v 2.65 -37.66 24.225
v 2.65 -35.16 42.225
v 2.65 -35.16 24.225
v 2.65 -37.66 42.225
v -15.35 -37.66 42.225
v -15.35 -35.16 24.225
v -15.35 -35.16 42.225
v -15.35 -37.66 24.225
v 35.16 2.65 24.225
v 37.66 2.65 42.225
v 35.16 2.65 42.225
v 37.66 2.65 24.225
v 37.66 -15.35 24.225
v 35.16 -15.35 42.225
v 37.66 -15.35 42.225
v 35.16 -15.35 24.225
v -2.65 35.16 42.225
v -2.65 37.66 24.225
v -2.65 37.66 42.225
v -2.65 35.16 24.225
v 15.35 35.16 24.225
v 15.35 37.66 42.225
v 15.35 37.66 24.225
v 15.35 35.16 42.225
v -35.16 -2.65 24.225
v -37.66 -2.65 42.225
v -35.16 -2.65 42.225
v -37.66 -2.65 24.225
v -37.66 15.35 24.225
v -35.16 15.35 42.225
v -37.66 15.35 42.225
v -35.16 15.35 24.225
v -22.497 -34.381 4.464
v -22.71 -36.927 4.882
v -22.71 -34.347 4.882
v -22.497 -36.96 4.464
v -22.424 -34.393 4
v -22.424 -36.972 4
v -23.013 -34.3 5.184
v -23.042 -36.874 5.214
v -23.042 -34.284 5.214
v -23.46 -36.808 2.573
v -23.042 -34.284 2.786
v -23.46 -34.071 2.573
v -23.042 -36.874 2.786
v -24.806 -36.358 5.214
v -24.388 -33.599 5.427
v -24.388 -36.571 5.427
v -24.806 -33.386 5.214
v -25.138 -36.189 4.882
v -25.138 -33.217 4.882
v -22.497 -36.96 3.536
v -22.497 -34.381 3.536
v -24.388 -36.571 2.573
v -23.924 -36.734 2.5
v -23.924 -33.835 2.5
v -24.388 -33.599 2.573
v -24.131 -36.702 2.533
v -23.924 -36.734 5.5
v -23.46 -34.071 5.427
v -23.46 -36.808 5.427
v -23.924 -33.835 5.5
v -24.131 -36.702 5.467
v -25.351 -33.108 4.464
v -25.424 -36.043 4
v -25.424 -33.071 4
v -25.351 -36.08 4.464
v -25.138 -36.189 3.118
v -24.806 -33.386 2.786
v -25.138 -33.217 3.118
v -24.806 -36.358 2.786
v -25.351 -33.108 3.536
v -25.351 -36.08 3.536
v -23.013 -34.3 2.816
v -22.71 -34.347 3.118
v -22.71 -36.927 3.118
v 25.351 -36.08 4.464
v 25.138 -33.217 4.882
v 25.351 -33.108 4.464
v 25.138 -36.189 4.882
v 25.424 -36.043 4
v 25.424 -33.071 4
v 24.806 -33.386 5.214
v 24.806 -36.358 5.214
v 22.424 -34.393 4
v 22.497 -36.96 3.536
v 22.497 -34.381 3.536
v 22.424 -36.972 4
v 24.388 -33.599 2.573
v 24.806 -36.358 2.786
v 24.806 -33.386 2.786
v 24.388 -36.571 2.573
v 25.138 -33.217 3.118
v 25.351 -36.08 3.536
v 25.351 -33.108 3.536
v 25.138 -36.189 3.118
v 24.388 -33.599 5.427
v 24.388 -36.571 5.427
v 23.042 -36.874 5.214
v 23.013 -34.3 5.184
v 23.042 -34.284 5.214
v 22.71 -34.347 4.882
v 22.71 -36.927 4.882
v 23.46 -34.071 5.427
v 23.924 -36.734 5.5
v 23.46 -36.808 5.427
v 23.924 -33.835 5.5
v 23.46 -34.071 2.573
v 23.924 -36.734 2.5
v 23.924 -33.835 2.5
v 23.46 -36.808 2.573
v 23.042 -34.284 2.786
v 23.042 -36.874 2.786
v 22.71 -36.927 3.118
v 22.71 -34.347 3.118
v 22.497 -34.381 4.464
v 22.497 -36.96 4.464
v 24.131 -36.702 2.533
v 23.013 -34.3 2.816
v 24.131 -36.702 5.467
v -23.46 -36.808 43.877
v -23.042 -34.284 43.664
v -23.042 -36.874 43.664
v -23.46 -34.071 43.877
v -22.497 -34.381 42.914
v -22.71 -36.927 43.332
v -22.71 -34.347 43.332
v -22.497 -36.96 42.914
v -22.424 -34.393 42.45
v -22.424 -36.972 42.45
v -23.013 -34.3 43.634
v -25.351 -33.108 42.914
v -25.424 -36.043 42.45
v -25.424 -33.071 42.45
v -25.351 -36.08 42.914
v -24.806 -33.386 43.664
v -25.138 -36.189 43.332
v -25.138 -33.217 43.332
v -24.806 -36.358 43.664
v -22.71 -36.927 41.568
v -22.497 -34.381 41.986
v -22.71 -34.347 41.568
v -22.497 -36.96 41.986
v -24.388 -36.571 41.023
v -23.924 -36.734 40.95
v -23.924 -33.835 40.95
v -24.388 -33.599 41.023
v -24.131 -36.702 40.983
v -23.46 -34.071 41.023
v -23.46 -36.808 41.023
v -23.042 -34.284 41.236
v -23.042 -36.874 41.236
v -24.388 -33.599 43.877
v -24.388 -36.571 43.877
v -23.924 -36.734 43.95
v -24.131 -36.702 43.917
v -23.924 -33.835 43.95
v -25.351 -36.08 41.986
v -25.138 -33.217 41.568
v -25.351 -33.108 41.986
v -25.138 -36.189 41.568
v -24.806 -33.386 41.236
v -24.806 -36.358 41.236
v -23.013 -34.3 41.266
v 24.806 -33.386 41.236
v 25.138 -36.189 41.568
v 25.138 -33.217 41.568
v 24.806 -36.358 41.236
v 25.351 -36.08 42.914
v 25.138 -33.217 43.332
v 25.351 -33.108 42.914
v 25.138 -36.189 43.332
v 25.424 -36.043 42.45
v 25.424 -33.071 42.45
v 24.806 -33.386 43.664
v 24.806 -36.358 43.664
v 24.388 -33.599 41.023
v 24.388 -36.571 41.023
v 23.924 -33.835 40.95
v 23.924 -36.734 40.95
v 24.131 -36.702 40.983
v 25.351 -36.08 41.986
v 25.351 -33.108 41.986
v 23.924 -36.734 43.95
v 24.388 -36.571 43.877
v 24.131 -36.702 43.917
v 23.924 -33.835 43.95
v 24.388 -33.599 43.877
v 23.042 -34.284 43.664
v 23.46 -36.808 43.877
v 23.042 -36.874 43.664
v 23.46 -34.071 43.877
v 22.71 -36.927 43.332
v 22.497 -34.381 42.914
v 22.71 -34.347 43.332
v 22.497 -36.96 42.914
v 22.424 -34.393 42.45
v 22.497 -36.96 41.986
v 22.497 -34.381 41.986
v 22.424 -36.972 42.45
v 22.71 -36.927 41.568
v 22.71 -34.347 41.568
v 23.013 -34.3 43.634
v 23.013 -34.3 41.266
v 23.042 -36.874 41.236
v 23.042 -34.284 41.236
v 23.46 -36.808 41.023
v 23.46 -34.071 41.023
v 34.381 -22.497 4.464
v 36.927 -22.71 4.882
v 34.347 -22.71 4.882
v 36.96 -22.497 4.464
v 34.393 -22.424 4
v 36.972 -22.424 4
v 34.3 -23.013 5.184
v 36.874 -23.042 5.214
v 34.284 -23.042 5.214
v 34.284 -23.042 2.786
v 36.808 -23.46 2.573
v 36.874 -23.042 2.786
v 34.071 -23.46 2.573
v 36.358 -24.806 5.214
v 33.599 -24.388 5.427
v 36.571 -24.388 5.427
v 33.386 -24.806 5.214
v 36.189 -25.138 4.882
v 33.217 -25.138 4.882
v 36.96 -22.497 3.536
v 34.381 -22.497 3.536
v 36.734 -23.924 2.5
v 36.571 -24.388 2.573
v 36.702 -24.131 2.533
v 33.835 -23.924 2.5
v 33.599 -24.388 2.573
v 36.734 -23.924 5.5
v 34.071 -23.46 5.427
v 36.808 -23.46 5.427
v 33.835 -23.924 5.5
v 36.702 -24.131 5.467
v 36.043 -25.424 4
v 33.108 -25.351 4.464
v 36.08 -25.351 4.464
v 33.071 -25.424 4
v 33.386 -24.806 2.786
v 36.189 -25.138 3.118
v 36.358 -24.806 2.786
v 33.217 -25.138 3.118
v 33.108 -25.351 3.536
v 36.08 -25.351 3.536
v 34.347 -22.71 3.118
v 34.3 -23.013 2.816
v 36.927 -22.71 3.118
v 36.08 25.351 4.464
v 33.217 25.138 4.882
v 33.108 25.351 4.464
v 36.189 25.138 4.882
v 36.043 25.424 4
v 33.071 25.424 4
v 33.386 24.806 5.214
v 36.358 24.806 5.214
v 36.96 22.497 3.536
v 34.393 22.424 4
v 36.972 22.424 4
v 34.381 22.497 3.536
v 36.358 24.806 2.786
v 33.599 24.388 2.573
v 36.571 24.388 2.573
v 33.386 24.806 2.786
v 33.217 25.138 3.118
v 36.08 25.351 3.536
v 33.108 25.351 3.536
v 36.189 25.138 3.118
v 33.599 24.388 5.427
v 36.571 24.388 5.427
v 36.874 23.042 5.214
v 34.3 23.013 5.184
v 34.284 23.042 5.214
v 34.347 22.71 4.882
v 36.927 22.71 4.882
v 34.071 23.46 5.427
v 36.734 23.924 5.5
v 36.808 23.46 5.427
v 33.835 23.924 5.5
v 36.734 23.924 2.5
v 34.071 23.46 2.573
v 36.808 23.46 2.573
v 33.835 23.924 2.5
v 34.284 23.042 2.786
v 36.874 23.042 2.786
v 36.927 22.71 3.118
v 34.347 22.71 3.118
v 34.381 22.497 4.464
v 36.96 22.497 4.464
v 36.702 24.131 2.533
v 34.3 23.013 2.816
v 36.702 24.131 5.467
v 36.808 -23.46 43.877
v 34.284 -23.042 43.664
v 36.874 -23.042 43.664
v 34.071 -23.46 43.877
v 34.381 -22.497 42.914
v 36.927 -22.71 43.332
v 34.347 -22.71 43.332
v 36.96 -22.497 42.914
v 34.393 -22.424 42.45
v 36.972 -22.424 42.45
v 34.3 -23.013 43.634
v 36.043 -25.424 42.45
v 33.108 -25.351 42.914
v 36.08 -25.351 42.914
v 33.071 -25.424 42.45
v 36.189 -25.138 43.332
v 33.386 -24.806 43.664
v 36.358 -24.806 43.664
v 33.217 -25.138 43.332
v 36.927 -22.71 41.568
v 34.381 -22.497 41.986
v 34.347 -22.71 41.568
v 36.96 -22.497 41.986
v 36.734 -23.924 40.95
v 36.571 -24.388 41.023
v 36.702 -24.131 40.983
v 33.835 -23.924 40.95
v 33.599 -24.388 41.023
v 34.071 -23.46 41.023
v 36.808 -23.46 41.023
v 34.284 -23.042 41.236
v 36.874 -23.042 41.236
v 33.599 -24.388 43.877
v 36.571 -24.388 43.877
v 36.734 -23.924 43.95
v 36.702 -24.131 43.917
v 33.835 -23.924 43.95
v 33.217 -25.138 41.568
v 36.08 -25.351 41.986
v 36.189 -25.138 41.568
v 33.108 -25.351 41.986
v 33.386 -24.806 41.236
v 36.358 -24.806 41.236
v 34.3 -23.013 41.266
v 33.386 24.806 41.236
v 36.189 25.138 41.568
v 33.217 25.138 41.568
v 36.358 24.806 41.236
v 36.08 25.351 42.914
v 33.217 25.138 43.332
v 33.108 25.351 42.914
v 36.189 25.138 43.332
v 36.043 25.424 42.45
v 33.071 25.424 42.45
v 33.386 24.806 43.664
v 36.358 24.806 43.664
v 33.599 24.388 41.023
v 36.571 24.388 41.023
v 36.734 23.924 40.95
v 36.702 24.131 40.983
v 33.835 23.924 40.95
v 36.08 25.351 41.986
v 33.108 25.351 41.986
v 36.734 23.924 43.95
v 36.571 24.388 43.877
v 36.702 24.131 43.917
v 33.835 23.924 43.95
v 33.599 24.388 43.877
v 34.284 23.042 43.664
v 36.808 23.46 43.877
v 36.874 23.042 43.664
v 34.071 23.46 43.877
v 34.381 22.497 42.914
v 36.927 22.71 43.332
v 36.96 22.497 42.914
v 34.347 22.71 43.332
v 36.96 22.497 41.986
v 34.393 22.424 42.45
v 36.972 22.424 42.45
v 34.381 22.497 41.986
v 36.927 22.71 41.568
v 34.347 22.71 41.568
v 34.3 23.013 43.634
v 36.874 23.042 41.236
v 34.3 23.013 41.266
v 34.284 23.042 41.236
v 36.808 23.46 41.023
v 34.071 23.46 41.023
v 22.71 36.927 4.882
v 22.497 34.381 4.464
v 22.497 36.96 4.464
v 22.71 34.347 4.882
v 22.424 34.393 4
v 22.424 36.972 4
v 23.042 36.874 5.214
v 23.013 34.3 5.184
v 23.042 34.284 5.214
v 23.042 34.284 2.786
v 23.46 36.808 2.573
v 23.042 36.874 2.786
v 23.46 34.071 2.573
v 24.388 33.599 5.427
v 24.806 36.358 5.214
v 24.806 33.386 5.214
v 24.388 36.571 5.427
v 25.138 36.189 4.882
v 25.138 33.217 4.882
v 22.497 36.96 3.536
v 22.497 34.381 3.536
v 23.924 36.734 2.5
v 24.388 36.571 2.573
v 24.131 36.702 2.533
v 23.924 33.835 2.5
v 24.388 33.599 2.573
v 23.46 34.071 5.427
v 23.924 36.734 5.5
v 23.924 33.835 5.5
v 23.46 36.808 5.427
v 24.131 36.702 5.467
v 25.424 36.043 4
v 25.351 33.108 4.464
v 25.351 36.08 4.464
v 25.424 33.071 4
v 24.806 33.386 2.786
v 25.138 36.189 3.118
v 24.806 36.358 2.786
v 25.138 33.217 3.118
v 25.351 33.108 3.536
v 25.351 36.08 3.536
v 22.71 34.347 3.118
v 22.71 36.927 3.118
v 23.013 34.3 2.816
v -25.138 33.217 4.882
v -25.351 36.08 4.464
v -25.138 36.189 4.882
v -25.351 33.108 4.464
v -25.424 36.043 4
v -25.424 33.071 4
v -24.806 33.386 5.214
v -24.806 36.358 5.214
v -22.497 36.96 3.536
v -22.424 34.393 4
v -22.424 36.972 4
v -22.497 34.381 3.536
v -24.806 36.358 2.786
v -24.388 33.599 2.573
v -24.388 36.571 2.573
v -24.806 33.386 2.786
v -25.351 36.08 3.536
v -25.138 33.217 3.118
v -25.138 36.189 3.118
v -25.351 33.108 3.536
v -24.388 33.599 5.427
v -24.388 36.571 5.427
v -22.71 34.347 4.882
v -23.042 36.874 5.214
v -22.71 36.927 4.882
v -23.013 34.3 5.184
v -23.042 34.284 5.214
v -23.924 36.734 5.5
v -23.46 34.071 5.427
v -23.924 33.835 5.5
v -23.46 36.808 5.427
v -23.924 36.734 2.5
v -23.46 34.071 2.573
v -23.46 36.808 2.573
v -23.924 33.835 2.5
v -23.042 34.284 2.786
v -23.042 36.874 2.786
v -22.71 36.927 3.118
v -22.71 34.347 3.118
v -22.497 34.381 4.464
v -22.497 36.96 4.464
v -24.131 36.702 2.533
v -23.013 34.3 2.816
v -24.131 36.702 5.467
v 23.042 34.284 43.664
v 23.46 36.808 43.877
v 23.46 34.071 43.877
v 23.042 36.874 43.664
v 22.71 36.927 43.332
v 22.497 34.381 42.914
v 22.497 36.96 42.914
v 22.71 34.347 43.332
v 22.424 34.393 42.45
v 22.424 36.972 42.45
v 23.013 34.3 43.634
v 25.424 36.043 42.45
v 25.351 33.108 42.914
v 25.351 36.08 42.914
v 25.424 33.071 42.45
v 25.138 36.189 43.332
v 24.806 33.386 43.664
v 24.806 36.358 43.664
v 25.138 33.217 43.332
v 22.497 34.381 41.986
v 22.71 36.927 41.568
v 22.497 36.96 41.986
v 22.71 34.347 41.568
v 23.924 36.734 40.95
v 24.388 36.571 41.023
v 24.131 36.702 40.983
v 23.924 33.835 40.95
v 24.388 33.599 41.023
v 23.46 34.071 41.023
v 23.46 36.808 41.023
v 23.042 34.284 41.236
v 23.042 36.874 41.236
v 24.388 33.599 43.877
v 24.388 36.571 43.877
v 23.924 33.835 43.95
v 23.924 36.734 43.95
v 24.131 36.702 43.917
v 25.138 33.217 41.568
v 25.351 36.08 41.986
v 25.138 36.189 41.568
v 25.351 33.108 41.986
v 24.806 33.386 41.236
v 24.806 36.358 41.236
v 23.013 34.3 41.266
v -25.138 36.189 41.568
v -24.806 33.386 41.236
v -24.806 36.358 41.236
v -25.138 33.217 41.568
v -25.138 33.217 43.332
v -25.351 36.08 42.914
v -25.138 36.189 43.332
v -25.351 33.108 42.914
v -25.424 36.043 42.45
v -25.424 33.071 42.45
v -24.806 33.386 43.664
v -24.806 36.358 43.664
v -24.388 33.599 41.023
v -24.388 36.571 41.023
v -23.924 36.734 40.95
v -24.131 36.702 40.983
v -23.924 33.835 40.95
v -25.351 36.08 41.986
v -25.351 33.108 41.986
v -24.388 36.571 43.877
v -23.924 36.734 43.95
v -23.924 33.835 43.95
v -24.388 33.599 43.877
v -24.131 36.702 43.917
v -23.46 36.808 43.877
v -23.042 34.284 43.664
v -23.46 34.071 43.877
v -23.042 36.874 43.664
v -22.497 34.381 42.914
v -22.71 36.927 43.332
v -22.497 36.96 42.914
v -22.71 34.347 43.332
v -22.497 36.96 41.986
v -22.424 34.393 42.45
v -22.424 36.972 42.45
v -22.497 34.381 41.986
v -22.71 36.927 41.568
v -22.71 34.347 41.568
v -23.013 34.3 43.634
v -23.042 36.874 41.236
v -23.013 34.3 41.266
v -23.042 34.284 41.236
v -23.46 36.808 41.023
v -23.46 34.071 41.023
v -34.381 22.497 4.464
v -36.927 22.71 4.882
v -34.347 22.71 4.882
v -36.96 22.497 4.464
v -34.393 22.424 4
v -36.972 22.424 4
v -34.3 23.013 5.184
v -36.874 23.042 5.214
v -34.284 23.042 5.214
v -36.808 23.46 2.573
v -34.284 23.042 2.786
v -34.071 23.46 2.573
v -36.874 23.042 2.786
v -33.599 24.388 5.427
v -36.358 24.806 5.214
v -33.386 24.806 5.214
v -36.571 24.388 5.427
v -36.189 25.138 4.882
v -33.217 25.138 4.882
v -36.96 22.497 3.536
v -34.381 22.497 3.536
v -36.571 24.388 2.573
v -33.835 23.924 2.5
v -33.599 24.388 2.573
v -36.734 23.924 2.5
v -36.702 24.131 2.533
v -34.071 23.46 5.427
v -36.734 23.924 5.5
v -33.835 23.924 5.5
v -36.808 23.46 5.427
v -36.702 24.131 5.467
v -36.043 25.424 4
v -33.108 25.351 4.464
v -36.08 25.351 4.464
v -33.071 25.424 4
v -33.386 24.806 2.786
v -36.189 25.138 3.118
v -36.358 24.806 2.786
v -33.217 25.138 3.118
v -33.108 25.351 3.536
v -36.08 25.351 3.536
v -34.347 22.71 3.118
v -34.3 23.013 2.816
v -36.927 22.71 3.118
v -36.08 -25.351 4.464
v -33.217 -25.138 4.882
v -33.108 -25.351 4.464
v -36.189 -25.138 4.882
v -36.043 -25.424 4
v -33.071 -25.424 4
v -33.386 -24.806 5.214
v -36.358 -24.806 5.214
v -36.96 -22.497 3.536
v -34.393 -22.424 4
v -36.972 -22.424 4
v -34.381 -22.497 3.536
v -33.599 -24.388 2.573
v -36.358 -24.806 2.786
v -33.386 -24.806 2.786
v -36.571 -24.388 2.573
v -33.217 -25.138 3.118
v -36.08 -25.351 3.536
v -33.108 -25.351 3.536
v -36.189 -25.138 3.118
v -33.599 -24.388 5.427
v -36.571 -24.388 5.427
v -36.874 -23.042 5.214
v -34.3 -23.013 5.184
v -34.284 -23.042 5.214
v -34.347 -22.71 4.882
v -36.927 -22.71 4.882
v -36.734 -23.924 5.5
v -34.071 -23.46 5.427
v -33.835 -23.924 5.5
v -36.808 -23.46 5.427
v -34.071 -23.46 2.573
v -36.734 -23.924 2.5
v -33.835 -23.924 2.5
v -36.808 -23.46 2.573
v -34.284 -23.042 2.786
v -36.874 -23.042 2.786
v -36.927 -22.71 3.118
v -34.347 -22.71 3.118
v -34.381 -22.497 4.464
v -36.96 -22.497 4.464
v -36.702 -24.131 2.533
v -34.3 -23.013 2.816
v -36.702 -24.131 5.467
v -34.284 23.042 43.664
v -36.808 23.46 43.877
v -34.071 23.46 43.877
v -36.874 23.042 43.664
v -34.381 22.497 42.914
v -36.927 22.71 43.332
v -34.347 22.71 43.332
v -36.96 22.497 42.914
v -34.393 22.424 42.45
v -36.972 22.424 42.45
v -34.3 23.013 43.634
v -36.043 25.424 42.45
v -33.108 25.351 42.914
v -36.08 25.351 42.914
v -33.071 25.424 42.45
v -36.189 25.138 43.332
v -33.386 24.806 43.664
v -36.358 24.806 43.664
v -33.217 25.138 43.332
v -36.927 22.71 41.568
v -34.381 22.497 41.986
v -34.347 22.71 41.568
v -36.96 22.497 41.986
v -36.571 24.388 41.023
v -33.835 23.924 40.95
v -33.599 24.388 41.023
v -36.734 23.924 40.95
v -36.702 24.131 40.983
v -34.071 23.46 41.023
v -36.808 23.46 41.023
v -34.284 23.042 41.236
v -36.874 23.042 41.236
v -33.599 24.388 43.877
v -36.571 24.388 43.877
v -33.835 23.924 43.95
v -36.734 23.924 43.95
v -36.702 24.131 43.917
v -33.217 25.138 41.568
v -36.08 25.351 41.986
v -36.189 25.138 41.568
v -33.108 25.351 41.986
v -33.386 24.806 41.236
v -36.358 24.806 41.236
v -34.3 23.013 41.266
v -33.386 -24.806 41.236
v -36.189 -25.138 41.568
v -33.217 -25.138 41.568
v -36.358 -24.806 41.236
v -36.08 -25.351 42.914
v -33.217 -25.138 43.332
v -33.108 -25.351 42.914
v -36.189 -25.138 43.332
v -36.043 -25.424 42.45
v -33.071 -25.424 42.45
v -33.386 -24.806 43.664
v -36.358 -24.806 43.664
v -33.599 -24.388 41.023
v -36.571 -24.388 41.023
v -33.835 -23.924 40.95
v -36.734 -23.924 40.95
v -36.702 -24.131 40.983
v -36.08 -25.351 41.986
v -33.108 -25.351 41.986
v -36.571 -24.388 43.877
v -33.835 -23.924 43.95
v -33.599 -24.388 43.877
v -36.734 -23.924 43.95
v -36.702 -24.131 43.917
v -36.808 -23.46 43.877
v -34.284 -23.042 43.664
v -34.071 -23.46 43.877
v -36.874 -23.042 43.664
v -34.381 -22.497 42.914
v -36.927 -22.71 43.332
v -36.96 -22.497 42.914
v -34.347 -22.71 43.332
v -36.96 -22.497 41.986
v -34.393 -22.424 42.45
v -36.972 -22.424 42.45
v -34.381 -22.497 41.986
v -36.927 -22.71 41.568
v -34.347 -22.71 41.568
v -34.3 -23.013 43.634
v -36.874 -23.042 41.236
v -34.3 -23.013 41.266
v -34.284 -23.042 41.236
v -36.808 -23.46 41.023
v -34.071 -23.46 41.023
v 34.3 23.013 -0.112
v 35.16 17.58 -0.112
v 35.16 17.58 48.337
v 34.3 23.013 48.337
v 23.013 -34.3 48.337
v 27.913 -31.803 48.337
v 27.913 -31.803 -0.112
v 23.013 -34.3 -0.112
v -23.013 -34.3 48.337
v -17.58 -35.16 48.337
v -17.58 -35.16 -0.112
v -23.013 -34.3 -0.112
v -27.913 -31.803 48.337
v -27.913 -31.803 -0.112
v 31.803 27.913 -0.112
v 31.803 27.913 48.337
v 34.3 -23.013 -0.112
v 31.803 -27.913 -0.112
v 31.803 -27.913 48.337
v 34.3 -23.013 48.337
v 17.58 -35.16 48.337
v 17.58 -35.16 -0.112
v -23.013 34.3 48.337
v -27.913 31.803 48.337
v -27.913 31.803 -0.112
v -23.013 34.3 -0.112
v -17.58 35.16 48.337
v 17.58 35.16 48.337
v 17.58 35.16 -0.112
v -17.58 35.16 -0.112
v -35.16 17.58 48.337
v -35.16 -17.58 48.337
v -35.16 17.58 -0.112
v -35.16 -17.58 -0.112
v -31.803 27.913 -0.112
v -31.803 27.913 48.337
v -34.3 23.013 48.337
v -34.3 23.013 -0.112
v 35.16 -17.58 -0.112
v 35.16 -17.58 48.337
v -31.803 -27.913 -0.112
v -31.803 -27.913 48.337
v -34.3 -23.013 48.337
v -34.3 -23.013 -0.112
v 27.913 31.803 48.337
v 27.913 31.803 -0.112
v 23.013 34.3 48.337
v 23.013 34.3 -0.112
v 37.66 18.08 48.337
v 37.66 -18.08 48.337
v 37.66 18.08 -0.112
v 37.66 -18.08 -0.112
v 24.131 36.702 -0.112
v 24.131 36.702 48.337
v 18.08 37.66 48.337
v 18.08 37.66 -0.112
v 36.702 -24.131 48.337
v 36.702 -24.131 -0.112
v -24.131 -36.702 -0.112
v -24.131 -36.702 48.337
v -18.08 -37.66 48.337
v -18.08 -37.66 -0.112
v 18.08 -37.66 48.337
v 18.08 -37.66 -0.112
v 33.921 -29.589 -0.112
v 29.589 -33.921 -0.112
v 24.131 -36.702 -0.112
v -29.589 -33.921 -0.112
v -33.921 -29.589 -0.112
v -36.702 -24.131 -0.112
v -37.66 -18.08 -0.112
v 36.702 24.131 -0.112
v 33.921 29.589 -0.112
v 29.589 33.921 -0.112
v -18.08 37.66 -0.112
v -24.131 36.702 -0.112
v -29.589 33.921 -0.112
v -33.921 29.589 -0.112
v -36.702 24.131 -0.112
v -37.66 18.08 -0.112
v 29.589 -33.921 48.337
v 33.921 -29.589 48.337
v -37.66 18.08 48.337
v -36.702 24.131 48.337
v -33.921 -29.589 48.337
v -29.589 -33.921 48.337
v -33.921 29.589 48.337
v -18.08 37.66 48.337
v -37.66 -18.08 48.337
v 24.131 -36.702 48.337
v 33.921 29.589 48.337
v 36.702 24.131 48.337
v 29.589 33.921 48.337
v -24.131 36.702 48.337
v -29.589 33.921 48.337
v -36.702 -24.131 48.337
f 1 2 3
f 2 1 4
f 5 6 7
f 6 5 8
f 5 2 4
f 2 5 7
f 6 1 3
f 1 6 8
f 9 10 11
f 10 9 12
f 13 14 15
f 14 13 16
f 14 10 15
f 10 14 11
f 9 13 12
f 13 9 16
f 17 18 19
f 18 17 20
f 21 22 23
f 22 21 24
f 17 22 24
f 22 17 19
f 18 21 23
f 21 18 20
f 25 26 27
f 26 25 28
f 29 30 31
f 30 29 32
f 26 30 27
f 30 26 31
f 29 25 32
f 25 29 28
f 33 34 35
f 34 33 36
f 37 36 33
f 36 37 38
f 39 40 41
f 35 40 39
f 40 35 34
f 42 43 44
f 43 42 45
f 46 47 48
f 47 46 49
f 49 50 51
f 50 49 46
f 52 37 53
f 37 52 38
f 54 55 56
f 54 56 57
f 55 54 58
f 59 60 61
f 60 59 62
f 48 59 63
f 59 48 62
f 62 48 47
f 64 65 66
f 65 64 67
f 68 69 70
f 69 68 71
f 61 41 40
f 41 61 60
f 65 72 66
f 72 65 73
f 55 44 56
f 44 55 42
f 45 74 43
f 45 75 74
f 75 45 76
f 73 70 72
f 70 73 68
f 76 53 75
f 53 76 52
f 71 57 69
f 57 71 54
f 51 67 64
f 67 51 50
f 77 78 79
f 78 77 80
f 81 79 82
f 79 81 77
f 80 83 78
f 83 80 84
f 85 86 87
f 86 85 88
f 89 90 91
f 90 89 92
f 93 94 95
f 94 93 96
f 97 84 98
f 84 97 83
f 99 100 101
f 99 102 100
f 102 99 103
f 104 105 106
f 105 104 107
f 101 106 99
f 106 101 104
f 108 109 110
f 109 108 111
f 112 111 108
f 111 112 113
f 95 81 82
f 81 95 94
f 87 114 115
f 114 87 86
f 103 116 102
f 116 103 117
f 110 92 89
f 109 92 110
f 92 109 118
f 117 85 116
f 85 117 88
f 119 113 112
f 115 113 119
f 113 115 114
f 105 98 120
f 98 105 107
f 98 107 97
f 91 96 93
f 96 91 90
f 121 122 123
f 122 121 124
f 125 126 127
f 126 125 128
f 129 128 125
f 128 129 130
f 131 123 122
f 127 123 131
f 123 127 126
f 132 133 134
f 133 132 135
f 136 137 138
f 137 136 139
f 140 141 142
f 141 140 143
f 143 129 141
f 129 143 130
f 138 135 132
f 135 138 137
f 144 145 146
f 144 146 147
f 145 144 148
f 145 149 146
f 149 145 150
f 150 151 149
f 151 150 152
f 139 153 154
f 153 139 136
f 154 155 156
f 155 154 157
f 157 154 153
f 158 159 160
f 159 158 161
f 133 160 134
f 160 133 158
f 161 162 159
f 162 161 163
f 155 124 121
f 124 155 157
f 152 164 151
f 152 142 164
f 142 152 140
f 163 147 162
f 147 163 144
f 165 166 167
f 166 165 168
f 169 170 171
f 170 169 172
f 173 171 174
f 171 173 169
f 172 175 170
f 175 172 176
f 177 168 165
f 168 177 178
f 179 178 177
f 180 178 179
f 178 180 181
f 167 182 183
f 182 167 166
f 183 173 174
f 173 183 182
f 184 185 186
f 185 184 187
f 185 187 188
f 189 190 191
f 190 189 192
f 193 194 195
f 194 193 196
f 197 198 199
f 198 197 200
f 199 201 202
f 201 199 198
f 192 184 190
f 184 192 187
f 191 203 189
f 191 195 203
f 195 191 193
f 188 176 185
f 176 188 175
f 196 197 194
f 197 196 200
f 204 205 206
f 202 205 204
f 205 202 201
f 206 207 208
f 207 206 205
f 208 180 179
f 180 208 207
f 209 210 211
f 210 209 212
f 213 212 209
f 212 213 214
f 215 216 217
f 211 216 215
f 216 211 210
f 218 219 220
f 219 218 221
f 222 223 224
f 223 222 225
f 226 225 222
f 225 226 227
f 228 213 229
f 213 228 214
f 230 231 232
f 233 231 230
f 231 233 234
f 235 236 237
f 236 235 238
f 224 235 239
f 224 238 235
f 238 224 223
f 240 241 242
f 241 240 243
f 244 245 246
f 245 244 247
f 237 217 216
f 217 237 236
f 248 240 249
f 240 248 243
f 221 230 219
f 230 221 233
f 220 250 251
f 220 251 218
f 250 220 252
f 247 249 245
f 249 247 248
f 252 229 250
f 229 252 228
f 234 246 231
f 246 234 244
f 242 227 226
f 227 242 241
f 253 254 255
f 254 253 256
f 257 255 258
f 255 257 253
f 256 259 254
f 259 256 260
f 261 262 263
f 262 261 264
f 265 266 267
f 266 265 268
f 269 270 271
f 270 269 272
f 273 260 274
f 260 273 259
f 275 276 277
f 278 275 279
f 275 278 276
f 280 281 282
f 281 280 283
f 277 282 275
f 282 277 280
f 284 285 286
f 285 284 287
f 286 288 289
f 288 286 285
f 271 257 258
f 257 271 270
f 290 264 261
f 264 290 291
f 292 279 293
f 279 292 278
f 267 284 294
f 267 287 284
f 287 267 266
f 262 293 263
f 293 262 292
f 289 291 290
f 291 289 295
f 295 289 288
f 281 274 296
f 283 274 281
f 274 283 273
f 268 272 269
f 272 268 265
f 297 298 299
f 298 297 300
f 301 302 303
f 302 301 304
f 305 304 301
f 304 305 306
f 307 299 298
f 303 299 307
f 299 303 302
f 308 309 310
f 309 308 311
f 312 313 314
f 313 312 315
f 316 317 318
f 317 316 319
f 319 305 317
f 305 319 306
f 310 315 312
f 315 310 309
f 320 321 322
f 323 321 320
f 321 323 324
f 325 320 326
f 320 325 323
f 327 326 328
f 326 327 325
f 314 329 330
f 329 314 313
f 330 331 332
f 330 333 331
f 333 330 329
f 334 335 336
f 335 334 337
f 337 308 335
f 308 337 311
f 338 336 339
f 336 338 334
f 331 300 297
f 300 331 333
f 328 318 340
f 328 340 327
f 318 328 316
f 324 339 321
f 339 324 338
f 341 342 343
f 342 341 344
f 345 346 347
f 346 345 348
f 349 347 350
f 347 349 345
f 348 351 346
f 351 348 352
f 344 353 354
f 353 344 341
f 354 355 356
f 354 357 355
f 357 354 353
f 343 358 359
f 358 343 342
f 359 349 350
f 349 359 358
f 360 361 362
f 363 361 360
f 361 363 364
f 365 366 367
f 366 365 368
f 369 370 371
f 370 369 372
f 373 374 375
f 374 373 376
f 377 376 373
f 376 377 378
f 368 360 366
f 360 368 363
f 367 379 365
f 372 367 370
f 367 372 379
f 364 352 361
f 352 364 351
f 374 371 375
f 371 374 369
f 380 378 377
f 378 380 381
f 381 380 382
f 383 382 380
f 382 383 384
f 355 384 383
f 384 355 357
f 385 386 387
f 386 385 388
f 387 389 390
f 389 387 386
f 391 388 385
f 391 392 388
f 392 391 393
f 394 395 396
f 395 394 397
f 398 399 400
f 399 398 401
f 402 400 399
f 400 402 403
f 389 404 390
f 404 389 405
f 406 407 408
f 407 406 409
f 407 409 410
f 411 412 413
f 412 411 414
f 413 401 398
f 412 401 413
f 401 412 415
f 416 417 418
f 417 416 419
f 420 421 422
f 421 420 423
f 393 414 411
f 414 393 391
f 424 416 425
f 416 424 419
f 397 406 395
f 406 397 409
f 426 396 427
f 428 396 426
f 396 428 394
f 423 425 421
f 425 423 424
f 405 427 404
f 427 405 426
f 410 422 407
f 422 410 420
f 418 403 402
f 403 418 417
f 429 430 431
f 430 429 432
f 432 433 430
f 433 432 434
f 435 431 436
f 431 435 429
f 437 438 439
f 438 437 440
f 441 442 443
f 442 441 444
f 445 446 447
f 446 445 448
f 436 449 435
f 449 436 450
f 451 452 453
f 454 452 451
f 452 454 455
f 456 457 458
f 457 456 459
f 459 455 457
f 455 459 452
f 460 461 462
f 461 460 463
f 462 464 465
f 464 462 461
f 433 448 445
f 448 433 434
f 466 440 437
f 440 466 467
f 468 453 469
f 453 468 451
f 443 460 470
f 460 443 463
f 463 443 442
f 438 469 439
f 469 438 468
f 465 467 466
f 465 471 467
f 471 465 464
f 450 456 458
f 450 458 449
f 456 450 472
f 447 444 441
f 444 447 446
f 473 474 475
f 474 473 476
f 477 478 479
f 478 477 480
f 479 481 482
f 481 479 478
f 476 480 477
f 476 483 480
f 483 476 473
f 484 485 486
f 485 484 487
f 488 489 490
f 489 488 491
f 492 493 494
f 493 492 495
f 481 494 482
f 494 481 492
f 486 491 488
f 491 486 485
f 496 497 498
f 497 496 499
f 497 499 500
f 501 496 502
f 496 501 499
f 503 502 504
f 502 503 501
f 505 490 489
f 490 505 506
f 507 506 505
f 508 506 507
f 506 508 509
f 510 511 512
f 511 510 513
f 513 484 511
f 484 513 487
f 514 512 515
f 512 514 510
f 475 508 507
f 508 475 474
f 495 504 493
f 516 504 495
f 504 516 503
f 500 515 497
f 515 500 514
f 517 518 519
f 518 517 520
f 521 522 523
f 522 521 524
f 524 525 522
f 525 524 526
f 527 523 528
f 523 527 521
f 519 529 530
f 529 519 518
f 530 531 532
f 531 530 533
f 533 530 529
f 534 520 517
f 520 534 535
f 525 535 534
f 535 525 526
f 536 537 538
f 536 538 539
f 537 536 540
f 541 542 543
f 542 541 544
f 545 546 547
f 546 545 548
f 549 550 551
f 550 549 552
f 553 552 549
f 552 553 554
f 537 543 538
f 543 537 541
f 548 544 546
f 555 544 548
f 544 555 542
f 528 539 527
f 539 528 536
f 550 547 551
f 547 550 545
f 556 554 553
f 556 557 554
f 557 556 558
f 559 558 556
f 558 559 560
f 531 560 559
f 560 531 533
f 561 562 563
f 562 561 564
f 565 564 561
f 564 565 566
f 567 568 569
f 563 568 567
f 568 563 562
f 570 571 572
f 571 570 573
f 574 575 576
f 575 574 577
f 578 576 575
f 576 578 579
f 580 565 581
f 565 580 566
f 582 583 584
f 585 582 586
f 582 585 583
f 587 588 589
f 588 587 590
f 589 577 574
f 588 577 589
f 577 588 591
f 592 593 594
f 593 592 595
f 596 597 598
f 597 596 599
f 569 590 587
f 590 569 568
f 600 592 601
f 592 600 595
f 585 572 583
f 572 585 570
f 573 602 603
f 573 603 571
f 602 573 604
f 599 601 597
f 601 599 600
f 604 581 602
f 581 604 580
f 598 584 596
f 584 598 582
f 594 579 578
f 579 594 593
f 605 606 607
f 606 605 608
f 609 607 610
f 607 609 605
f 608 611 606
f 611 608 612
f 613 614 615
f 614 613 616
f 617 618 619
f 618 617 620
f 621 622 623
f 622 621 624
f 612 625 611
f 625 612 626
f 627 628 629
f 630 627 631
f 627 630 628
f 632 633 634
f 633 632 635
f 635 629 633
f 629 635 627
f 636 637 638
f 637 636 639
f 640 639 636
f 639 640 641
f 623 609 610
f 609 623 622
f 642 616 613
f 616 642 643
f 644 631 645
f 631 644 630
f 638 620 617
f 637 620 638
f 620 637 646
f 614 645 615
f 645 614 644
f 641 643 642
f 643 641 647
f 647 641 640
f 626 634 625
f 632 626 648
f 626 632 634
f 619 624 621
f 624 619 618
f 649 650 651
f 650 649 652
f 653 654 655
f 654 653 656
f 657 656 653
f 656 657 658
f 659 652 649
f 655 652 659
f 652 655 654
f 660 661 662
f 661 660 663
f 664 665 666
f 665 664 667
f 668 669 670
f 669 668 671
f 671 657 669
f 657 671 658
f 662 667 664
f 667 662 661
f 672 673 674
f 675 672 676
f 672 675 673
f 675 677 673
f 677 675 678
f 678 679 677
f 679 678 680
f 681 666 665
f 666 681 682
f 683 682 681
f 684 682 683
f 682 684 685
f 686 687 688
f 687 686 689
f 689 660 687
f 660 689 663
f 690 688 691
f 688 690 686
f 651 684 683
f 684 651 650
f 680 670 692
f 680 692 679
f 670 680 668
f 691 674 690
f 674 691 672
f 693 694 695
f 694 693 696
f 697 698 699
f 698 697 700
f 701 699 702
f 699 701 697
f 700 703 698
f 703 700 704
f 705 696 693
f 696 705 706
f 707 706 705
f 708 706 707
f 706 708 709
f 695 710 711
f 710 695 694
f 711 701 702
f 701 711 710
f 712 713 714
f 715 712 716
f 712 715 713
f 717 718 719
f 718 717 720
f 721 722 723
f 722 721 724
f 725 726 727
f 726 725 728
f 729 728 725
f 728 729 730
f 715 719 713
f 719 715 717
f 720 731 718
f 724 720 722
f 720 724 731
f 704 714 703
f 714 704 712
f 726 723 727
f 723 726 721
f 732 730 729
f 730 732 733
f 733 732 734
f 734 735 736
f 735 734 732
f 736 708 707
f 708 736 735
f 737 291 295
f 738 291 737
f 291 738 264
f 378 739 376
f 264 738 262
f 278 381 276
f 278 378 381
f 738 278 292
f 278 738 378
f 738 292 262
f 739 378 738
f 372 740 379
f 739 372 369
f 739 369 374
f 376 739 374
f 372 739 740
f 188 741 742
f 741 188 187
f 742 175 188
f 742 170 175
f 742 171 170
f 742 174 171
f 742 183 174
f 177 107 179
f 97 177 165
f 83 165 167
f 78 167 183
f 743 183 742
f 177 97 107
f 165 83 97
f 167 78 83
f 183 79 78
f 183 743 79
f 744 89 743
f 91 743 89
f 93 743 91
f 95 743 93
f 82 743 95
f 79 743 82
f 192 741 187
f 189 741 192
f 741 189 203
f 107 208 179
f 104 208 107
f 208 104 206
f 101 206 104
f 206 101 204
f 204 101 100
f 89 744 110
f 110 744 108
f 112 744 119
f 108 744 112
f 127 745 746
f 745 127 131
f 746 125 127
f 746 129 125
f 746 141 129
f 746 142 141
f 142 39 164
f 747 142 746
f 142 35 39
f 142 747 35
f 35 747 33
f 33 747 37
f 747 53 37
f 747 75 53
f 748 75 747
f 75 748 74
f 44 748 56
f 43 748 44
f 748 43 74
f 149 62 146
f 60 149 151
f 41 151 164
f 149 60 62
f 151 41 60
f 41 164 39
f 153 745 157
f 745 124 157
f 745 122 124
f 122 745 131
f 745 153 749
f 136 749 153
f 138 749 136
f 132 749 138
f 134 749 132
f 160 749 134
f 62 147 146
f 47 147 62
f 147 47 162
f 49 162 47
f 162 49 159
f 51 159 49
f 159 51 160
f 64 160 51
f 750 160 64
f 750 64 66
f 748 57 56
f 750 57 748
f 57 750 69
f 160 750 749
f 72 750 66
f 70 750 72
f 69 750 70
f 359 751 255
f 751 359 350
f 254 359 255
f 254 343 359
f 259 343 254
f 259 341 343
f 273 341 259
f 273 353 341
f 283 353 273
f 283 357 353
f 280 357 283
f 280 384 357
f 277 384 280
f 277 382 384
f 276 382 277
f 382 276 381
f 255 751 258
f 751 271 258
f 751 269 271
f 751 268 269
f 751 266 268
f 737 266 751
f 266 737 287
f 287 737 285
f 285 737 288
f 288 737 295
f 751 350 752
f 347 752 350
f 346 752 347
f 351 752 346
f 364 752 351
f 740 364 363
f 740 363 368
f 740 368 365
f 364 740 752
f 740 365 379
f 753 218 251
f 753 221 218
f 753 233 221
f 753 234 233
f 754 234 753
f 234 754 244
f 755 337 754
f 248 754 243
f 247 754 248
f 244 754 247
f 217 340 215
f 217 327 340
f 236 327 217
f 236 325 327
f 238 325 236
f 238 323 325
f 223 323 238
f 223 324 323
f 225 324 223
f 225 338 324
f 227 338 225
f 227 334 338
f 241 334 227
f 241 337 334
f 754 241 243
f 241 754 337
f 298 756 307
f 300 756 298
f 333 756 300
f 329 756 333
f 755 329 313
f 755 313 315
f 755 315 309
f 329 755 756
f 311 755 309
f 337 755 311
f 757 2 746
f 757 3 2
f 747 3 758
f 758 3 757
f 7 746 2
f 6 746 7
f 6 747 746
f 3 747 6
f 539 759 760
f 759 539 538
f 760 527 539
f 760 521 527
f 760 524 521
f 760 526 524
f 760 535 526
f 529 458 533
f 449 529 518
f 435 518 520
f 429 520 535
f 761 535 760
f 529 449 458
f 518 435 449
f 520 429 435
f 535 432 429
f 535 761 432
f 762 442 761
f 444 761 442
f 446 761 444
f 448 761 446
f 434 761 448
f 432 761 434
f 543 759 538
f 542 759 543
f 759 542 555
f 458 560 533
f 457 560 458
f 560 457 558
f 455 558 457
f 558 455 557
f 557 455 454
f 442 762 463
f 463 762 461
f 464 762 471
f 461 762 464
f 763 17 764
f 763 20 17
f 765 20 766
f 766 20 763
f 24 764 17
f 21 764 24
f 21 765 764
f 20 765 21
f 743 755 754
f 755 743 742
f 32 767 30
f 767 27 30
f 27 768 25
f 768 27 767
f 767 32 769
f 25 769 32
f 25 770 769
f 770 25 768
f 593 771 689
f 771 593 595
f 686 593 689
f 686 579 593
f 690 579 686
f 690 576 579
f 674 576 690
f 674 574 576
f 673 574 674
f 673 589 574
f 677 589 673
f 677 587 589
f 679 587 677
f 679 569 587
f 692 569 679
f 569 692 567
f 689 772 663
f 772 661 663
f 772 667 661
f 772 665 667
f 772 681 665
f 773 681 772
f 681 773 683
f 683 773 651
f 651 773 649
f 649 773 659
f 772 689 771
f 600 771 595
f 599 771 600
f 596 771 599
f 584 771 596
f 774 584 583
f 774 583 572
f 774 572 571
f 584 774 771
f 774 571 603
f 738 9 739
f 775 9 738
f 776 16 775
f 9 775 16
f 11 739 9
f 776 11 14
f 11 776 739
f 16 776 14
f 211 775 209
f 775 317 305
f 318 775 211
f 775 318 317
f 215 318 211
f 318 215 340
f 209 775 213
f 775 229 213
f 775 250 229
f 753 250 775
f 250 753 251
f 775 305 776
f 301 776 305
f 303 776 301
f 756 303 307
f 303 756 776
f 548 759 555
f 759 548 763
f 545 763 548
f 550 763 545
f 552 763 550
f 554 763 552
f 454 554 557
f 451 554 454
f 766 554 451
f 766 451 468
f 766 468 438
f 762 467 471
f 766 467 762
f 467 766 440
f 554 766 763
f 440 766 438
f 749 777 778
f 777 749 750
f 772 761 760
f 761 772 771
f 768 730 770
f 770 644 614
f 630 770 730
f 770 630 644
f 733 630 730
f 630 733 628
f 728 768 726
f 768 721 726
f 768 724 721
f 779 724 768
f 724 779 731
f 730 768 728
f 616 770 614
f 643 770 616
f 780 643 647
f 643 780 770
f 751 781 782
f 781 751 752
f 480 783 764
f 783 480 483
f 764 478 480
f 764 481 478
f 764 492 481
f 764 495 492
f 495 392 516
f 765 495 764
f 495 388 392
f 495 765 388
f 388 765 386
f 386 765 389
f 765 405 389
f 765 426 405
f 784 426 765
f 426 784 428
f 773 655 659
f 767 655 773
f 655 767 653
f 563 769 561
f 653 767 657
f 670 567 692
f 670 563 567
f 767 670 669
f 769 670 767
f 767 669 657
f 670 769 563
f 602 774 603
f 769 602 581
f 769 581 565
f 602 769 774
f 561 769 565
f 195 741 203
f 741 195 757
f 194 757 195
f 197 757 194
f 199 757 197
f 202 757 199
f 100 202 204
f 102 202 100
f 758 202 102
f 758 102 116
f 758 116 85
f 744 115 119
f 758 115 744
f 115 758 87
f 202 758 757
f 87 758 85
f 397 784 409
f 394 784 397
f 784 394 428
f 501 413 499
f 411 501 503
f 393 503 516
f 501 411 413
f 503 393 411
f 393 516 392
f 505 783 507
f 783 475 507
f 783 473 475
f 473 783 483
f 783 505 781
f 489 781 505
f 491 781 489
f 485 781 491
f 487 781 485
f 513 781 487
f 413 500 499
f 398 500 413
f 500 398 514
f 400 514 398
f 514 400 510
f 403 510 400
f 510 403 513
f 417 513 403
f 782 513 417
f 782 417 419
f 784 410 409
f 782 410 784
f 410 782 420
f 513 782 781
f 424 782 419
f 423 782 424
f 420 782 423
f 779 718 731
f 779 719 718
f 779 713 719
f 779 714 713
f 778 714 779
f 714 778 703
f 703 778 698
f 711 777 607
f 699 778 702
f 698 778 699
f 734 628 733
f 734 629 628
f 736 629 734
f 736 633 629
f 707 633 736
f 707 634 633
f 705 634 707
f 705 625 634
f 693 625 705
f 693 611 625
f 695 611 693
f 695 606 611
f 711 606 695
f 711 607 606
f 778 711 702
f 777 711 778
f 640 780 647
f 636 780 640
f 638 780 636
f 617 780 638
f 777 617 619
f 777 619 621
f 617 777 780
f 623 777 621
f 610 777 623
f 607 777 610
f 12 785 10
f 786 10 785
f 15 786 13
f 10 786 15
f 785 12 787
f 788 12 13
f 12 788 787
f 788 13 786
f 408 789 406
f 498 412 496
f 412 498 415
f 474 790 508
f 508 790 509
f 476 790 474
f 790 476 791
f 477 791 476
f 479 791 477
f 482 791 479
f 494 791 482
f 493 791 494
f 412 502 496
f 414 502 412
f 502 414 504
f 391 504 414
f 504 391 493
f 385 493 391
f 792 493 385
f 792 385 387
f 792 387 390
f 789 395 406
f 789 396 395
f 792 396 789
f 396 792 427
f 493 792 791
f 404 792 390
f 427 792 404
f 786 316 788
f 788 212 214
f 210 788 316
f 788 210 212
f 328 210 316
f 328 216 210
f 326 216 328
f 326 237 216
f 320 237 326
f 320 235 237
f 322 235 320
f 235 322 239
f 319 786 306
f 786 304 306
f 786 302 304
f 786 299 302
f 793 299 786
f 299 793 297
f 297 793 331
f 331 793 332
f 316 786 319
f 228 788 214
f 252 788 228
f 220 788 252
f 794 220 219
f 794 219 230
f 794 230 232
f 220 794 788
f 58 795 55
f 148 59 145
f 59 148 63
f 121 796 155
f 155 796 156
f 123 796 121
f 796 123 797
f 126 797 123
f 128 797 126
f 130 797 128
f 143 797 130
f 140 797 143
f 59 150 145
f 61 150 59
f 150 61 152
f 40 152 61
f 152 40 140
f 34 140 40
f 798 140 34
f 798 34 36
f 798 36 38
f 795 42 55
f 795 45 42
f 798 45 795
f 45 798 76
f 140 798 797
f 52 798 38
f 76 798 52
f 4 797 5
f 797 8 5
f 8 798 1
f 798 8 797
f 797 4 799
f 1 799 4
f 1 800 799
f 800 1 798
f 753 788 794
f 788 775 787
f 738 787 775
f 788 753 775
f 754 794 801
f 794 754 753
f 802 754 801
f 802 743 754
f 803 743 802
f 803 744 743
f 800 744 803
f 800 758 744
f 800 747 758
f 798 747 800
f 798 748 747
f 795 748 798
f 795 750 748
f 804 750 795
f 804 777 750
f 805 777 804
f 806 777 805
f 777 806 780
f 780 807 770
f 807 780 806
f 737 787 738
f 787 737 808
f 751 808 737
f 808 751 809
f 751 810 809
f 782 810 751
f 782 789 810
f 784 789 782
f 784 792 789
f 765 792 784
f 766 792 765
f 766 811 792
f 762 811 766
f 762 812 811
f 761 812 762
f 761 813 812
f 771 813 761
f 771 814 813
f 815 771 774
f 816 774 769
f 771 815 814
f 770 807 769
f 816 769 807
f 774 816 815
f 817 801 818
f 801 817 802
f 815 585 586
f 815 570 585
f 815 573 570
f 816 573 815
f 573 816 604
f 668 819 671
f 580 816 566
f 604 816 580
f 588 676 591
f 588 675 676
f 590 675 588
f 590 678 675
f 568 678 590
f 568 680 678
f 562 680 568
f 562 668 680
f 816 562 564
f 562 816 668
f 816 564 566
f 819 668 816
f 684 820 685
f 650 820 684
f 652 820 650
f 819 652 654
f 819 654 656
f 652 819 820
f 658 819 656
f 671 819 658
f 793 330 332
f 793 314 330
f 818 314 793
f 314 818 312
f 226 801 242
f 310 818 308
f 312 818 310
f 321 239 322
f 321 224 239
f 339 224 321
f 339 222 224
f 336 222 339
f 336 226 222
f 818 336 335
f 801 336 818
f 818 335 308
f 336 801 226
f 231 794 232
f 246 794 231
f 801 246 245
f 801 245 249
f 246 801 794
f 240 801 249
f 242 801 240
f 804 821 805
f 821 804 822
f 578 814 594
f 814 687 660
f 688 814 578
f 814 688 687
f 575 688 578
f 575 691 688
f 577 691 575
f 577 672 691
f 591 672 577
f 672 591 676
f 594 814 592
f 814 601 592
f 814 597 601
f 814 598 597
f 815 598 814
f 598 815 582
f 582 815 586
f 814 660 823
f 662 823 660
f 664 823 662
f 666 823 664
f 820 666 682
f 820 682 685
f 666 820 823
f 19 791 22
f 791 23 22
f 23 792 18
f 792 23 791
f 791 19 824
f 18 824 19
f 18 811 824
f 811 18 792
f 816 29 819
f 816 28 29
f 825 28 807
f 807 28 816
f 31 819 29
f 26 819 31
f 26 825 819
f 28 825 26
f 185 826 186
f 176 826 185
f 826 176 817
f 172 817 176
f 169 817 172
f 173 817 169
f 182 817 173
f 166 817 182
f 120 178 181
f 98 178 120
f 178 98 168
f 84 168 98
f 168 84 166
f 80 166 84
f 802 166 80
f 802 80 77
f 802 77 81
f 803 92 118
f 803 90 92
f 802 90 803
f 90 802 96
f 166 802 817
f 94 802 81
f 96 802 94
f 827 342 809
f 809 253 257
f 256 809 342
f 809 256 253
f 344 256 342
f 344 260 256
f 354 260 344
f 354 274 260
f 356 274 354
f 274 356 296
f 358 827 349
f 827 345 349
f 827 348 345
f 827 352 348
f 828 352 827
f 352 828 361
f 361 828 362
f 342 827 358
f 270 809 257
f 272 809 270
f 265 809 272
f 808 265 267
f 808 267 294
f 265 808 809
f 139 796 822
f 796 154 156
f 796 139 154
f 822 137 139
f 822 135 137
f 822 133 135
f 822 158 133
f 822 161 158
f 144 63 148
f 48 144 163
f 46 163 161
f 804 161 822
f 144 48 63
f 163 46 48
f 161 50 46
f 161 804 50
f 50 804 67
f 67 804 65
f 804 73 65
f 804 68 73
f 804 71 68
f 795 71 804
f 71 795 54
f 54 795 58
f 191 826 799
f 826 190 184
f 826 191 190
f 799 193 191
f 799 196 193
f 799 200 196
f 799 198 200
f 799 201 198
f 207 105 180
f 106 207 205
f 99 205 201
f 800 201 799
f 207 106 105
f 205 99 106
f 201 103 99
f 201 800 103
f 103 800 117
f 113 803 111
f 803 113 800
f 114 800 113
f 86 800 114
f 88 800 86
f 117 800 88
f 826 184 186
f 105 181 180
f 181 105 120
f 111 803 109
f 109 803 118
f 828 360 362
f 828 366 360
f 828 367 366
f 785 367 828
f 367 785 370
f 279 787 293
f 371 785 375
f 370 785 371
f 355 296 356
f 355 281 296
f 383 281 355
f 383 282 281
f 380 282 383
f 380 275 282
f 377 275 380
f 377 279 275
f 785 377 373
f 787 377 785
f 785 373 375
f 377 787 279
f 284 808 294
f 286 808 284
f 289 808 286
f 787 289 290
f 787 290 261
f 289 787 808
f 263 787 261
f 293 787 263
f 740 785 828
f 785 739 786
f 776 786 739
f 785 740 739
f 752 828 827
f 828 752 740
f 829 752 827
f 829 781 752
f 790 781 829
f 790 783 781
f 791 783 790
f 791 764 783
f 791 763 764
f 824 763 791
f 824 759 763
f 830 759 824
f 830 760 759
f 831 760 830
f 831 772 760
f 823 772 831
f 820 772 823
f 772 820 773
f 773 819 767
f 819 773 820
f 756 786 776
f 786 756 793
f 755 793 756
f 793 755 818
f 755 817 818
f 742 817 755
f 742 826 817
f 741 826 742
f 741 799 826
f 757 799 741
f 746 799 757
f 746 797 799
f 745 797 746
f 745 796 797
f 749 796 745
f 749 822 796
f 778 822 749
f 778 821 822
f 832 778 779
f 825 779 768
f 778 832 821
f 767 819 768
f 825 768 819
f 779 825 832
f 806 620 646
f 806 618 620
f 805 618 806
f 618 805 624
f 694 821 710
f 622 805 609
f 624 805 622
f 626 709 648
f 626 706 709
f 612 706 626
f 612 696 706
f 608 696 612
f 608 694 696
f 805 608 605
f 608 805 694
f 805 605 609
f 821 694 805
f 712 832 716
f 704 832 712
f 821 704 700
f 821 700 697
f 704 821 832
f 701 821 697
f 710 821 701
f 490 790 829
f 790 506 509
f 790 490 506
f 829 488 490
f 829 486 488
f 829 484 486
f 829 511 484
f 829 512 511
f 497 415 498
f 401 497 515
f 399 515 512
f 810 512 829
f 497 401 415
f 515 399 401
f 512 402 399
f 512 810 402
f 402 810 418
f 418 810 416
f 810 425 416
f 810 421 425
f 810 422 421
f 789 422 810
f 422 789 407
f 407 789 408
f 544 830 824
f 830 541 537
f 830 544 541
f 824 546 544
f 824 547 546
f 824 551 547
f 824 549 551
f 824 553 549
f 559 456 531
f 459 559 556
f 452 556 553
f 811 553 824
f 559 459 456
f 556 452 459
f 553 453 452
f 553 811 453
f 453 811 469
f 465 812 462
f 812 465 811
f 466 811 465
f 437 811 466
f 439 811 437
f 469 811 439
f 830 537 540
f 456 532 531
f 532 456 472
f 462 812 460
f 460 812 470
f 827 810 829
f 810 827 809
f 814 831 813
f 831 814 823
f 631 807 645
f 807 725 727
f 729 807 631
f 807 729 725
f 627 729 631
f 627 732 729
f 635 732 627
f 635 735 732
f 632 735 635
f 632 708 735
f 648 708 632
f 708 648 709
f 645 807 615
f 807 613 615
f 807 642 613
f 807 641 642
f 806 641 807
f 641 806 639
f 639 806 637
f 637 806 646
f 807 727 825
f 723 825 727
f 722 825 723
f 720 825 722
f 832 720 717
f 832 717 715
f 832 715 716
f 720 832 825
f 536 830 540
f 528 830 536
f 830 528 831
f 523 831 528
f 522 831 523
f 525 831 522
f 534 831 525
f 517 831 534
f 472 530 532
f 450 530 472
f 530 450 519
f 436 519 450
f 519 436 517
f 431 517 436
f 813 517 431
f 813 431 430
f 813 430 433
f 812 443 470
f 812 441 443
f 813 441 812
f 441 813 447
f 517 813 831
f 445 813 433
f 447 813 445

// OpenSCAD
	pixylength=2.12*25.4; //L inch->mm
	pixywidth=1.75*25.4; //W inch->mm
	camheight=0.8*25.4; //H inch->mm
	pixyheight=1.5; //H PCB
	pixyholediameter=3;
	pixyholedistance=3;
	camradius=8;
	cambaseheight=10;
	cambasewidth=18;
	campcboffset=10;

module pixyholes() {
		union() {
			translate([-pixylength/2+pixyholedistance,-pixywidth/2+pixyholedistance,-1]) rotate([0,0,0]) cylinder(r=pixyholediameter/2,h=pixyheight+20);
			translate([pixylength/2-pixyholedistance,-pixywidth/2+pixyholedistance,-1]) rotate([0,0,0]) cylinder(r=pixyholediameter/2,h=pixyheight+20);
			translate([-pixylength/2+pixyholedistance,pixywidth/2-pixyholedistance,-1]) rotate([0,0,0]) cylinder(r=pixyholediameter/2,h=pixyheight+20);
			translate([pixylength/2-pixyholedistance,pixywidth/2-pixyholedistance,-1]) rotate([0,0,0]) cylinder(r=pixyholediameter/2,h=pixyheight+20);
		}
}

module pixycam() {
	translate([-0.25*25.4,campcboffset,0]) cylinder(r=camradius,h=camheight);
	translate([-cambasewidth/2-0.25*25.4,-cambasewidth/2+campcboffset,0]) cube([cambasewidth,cambasewidth,cambaseheight]);
	difference() {
		translate([-pixylength/2,-pixywidth/2,0]) cube([pixylength,pixywidth,pixyheight]);
		pixyholes();
	};
}

center_offset=30;


mount_thickness=2;
cammount_height=pixywidth+2*mount_thickness;
cammount_inline=16;
cammount_outline=center_offset*2+camheight+cambaseheight;

$fn=20;

module outerbox() {
minkowski() {
cube([cammount_outline/2-9,cammount_height/2,cammount_outline/2-9],true);
translate([0,13,0]) rotate([90,0,0]) cylinder(r=cammount_outline/4-3,h=cammount_height/2);
}
}

module innerbox() {
minkowski() {
cube([cammount_outline/2-10,cammount_height/2+2,cammount_outline/2-10],true);
translate([0,13,0]) rotate([90,0,0]) cylinder(r=cammount_outline/4-5,h=cammount_height/2+2);
}
}

translate([0,0,cammount_height/2-1]) rotate ([90,0,0]) difference() {
outerbox();
union() {
innerbox();
rotate([0,0,0]) translate ([0,0,center_offset]) pixycam();
rotate([0,90,0]) translate ([0,0,center_offset]) pixycam();
rotate([0,180,0]) translate ([0,0,center_offset]) pixycam();
rotate([0,270,0]) translate ([0,0,center_offset]) pixycam();
rotate([0,0,0]) translate ([0,0,center_offset]) pixyholes();
rotate([0,90,0]) translate ([0,0,center_offset]) pixyholes();
rotate([0,180,0]) translate ([0,0,center_offset]) pixyholes();
rotate([0,270,0]) translate ([0,0,center_offset]) pixyholes();
}
}
